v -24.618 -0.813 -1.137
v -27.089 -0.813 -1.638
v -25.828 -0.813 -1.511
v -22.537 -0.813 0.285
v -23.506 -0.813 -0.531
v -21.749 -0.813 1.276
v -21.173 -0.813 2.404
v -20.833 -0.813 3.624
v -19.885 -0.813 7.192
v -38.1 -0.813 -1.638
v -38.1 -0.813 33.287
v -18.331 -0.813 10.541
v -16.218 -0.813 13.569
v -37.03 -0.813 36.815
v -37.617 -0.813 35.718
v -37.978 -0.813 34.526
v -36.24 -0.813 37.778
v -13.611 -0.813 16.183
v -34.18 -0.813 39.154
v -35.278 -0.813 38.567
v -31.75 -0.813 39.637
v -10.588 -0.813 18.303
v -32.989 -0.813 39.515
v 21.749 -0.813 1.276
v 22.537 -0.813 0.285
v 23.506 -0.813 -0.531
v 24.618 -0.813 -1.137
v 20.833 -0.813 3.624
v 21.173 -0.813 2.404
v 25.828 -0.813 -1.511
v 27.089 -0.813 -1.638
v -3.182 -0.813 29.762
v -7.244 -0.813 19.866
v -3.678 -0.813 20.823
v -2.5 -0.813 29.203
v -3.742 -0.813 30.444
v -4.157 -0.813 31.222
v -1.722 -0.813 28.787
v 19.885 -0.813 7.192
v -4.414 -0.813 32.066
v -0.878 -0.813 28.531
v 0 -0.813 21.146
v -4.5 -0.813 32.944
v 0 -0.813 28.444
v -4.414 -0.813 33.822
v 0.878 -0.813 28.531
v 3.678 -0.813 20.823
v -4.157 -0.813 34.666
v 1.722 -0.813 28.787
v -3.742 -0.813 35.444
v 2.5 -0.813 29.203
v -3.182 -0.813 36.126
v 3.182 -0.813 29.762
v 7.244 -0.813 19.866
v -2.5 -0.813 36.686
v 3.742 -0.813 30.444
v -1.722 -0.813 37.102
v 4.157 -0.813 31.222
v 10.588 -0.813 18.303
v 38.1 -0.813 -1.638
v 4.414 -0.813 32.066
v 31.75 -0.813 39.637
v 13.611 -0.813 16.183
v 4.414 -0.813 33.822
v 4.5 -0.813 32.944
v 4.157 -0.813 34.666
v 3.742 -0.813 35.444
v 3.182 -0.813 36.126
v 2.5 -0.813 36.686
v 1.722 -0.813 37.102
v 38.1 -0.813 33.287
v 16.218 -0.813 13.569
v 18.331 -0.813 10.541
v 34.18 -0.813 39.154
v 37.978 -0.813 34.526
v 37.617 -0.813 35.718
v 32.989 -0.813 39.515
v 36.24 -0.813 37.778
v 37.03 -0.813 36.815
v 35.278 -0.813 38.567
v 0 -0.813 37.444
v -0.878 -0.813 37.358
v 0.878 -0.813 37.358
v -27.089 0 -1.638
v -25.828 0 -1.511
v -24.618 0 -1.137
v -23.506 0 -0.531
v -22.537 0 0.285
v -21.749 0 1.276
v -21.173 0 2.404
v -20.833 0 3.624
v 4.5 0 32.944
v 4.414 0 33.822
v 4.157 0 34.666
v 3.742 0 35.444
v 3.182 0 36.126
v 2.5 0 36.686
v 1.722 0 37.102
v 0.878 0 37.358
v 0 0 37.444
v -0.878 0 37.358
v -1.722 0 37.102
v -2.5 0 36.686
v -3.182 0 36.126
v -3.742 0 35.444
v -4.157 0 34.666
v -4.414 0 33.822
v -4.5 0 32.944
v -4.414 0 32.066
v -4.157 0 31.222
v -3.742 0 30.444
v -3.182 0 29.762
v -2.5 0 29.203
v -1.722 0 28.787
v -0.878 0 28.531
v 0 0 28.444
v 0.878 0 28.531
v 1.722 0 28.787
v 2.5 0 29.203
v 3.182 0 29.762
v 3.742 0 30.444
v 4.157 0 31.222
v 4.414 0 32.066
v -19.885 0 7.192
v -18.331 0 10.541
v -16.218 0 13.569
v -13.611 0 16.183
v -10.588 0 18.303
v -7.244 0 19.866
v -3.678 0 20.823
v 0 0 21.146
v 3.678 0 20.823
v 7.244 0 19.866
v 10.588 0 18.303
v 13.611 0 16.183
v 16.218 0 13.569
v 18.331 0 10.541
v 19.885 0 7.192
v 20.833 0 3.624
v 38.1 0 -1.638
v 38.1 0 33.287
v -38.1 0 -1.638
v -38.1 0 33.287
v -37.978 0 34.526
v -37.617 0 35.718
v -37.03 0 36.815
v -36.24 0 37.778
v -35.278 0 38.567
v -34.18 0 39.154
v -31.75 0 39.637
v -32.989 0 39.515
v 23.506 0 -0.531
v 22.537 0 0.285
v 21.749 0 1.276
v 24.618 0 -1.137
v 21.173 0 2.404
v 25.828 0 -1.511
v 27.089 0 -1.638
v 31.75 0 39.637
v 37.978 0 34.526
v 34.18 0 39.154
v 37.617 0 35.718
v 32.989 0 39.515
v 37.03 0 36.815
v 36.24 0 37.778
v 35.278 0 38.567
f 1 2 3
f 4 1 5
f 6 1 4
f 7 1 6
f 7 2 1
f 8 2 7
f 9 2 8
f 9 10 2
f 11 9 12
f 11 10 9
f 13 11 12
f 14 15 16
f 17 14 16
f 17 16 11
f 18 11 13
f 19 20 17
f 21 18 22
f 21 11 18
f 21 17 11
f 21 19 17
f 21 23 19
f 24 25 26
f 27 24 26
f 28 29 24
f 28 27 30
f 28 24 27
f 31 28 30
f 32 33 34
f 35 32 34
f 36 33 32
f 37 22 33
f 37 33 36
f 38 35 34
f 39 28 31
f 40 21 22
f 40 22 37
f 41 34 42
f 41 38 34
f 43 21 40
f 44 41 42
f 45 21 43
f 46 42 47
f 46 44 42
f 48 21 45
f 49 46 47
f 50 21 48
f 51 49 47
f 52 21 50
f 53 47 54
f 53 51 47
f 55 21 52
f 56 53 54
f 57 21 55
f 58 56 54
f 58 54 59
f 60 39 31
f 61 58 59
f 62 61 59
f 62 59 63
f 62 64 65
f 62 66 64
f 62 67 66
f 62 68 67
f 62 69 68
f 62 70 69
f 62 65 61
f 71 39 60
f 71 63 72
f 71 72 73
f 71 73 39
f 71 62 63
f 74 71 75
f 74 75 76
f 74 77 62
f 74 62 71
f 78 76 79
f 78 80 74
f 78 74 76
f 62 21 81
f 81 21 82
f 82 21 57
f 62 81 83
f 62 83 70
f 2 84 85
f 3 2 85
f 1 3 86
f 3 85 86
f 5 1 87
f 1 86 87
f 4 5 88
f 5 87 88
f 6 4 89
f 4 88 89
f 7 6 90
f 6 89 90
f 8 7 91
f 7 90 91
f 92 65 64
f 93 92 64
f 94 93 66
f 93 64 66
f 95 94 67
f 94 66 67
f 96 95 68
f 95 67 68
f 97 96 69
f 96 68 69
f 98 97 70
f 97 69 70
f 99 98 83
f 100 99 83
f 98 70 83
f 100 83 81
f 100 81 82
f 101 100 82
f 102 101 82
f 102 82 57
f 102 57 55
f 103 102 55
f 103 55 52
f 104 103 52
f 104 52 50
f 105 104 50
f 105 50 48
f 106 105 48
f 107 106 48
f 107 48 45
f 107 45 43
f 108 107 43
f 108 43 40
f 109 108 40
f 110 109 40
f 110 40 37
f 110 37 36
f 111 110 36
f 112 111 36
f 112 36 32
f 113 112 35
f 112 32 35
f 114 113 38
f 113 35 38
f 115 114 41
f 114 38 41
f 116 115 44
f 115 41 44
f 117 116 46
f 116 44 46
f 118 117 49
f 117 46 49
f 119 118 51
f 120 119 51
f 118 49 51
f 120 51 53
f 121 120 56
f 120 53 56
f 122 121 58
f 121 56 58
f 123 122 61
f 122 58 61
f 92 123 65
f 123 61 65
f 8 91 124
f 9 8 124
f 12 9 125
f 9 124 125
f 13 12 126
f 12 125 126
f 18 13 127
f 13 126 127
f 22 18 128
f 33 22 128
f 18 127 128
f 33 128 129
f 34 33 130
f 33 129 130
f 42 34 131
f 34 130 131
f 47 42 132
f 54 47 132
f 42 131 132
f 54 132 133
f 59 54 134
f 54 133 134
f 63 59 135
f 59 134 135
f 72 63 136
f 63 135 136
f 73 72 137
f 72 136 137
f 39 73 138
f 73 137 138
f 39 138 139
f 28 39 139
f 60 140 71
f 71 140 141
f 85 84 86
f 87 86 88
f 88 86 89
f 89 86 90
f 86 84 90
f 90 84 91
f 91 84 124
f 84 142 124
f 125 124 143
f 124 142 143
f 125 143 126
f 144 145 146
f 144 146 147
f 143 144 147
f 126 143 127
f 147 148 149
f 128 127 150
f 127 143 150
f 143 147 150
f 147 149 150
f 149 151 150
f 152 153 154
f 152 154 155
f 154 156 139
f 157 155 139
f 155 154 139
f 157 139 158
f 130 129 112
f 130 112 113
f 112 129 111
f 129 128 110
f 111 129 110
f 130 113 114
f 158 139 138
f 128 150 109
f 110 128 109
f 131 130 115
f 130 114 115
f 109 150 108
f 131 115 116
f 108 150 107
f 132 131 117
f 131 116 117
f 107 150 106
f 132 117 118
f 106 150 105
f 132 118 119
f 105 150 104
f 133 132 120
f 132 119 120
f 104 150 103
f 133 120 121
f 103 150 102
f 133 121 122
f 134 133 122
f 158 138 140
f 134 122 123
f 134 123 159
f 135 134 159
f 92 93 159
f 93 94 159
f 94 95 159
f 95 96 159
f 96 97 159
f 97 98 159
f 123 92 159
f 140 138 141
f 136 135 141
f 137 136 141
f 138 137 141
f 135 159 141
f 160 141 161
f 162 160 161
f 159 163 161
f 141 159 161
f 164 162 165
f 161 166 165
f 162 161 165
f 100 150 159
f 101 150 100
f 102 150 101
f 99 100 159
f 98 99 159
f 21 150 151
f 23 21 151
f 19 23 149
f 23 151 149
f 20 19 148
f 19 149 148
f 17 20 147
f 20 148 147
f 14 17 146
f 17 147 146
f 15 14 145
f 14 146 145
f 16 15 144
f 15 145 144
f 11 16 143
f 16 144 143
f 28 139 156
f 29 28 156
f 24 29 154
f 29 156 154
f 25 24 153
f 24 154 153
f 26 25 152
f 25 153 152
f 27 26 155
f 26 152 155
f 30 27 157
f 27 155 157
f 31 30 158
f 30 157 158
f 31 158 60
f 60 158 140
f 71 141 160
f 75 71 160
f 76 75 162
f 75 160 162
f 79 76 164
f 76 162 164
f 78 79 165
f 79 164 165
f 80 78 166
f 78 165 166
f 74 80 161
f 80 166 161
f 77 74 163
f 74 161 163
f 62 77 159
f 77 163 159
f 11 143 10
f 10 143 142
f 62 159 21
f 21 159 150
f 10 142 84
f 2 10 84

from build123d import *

# Parameters (mm, degrees)
F1_DEPTH = 0.8128
F2_R     = 4.5
F3_DEPTH = 25.4


with BuildPart() as f1:
    # F0 (on Front) → F1 (new body)
    with BuildSketch(Plane.XZ):
        with BuildLine():
            ThreePointArc((-20.832611, 3.624153), (0, 21.1455), (20.832611, 3.624153))
            ThreePointArc((20.832611, 3.624153), (23.001379, -0.147215), (27.08865, -1.637512))
            Line((27.08865, -1.637512), (38.1, -1.637512))
            Line((38.1, -1.637512), (38.1, 33.287488))
            ThreePointArc((38.1, 33.287488), (36.240128, 37.777616), (31.75, 39.637488))
            Line((31.75, 39.637488), (-31.75, 39.637488))
            ThreePointArc((-31.75, 39.637488), (-36.240128, 37.777616), (-38.1, 33.287488))
            Line((-38.1, 33.287488), (-38.1, -1.637512))
            Line((-38.1, -1.637512), (-27.08865, -1.637512))
            ThreePointArc((-27.08865, -1.637512), (-23.001379, -0.147215), (-20.832611, 3.624153))
        make_face()
    extrude(amount=F1_DEPTH)

    # F2 (on face) → F3 (cut)
    with BuildSketch(Plane.XZ.offset(0.8128)):
        with Locations((0, 32.944188)):
            Circle(F2_R)
    extrude(amount=-F3_DEPTH, mode=Mode.SUBTRACT)


solid = f1.part
